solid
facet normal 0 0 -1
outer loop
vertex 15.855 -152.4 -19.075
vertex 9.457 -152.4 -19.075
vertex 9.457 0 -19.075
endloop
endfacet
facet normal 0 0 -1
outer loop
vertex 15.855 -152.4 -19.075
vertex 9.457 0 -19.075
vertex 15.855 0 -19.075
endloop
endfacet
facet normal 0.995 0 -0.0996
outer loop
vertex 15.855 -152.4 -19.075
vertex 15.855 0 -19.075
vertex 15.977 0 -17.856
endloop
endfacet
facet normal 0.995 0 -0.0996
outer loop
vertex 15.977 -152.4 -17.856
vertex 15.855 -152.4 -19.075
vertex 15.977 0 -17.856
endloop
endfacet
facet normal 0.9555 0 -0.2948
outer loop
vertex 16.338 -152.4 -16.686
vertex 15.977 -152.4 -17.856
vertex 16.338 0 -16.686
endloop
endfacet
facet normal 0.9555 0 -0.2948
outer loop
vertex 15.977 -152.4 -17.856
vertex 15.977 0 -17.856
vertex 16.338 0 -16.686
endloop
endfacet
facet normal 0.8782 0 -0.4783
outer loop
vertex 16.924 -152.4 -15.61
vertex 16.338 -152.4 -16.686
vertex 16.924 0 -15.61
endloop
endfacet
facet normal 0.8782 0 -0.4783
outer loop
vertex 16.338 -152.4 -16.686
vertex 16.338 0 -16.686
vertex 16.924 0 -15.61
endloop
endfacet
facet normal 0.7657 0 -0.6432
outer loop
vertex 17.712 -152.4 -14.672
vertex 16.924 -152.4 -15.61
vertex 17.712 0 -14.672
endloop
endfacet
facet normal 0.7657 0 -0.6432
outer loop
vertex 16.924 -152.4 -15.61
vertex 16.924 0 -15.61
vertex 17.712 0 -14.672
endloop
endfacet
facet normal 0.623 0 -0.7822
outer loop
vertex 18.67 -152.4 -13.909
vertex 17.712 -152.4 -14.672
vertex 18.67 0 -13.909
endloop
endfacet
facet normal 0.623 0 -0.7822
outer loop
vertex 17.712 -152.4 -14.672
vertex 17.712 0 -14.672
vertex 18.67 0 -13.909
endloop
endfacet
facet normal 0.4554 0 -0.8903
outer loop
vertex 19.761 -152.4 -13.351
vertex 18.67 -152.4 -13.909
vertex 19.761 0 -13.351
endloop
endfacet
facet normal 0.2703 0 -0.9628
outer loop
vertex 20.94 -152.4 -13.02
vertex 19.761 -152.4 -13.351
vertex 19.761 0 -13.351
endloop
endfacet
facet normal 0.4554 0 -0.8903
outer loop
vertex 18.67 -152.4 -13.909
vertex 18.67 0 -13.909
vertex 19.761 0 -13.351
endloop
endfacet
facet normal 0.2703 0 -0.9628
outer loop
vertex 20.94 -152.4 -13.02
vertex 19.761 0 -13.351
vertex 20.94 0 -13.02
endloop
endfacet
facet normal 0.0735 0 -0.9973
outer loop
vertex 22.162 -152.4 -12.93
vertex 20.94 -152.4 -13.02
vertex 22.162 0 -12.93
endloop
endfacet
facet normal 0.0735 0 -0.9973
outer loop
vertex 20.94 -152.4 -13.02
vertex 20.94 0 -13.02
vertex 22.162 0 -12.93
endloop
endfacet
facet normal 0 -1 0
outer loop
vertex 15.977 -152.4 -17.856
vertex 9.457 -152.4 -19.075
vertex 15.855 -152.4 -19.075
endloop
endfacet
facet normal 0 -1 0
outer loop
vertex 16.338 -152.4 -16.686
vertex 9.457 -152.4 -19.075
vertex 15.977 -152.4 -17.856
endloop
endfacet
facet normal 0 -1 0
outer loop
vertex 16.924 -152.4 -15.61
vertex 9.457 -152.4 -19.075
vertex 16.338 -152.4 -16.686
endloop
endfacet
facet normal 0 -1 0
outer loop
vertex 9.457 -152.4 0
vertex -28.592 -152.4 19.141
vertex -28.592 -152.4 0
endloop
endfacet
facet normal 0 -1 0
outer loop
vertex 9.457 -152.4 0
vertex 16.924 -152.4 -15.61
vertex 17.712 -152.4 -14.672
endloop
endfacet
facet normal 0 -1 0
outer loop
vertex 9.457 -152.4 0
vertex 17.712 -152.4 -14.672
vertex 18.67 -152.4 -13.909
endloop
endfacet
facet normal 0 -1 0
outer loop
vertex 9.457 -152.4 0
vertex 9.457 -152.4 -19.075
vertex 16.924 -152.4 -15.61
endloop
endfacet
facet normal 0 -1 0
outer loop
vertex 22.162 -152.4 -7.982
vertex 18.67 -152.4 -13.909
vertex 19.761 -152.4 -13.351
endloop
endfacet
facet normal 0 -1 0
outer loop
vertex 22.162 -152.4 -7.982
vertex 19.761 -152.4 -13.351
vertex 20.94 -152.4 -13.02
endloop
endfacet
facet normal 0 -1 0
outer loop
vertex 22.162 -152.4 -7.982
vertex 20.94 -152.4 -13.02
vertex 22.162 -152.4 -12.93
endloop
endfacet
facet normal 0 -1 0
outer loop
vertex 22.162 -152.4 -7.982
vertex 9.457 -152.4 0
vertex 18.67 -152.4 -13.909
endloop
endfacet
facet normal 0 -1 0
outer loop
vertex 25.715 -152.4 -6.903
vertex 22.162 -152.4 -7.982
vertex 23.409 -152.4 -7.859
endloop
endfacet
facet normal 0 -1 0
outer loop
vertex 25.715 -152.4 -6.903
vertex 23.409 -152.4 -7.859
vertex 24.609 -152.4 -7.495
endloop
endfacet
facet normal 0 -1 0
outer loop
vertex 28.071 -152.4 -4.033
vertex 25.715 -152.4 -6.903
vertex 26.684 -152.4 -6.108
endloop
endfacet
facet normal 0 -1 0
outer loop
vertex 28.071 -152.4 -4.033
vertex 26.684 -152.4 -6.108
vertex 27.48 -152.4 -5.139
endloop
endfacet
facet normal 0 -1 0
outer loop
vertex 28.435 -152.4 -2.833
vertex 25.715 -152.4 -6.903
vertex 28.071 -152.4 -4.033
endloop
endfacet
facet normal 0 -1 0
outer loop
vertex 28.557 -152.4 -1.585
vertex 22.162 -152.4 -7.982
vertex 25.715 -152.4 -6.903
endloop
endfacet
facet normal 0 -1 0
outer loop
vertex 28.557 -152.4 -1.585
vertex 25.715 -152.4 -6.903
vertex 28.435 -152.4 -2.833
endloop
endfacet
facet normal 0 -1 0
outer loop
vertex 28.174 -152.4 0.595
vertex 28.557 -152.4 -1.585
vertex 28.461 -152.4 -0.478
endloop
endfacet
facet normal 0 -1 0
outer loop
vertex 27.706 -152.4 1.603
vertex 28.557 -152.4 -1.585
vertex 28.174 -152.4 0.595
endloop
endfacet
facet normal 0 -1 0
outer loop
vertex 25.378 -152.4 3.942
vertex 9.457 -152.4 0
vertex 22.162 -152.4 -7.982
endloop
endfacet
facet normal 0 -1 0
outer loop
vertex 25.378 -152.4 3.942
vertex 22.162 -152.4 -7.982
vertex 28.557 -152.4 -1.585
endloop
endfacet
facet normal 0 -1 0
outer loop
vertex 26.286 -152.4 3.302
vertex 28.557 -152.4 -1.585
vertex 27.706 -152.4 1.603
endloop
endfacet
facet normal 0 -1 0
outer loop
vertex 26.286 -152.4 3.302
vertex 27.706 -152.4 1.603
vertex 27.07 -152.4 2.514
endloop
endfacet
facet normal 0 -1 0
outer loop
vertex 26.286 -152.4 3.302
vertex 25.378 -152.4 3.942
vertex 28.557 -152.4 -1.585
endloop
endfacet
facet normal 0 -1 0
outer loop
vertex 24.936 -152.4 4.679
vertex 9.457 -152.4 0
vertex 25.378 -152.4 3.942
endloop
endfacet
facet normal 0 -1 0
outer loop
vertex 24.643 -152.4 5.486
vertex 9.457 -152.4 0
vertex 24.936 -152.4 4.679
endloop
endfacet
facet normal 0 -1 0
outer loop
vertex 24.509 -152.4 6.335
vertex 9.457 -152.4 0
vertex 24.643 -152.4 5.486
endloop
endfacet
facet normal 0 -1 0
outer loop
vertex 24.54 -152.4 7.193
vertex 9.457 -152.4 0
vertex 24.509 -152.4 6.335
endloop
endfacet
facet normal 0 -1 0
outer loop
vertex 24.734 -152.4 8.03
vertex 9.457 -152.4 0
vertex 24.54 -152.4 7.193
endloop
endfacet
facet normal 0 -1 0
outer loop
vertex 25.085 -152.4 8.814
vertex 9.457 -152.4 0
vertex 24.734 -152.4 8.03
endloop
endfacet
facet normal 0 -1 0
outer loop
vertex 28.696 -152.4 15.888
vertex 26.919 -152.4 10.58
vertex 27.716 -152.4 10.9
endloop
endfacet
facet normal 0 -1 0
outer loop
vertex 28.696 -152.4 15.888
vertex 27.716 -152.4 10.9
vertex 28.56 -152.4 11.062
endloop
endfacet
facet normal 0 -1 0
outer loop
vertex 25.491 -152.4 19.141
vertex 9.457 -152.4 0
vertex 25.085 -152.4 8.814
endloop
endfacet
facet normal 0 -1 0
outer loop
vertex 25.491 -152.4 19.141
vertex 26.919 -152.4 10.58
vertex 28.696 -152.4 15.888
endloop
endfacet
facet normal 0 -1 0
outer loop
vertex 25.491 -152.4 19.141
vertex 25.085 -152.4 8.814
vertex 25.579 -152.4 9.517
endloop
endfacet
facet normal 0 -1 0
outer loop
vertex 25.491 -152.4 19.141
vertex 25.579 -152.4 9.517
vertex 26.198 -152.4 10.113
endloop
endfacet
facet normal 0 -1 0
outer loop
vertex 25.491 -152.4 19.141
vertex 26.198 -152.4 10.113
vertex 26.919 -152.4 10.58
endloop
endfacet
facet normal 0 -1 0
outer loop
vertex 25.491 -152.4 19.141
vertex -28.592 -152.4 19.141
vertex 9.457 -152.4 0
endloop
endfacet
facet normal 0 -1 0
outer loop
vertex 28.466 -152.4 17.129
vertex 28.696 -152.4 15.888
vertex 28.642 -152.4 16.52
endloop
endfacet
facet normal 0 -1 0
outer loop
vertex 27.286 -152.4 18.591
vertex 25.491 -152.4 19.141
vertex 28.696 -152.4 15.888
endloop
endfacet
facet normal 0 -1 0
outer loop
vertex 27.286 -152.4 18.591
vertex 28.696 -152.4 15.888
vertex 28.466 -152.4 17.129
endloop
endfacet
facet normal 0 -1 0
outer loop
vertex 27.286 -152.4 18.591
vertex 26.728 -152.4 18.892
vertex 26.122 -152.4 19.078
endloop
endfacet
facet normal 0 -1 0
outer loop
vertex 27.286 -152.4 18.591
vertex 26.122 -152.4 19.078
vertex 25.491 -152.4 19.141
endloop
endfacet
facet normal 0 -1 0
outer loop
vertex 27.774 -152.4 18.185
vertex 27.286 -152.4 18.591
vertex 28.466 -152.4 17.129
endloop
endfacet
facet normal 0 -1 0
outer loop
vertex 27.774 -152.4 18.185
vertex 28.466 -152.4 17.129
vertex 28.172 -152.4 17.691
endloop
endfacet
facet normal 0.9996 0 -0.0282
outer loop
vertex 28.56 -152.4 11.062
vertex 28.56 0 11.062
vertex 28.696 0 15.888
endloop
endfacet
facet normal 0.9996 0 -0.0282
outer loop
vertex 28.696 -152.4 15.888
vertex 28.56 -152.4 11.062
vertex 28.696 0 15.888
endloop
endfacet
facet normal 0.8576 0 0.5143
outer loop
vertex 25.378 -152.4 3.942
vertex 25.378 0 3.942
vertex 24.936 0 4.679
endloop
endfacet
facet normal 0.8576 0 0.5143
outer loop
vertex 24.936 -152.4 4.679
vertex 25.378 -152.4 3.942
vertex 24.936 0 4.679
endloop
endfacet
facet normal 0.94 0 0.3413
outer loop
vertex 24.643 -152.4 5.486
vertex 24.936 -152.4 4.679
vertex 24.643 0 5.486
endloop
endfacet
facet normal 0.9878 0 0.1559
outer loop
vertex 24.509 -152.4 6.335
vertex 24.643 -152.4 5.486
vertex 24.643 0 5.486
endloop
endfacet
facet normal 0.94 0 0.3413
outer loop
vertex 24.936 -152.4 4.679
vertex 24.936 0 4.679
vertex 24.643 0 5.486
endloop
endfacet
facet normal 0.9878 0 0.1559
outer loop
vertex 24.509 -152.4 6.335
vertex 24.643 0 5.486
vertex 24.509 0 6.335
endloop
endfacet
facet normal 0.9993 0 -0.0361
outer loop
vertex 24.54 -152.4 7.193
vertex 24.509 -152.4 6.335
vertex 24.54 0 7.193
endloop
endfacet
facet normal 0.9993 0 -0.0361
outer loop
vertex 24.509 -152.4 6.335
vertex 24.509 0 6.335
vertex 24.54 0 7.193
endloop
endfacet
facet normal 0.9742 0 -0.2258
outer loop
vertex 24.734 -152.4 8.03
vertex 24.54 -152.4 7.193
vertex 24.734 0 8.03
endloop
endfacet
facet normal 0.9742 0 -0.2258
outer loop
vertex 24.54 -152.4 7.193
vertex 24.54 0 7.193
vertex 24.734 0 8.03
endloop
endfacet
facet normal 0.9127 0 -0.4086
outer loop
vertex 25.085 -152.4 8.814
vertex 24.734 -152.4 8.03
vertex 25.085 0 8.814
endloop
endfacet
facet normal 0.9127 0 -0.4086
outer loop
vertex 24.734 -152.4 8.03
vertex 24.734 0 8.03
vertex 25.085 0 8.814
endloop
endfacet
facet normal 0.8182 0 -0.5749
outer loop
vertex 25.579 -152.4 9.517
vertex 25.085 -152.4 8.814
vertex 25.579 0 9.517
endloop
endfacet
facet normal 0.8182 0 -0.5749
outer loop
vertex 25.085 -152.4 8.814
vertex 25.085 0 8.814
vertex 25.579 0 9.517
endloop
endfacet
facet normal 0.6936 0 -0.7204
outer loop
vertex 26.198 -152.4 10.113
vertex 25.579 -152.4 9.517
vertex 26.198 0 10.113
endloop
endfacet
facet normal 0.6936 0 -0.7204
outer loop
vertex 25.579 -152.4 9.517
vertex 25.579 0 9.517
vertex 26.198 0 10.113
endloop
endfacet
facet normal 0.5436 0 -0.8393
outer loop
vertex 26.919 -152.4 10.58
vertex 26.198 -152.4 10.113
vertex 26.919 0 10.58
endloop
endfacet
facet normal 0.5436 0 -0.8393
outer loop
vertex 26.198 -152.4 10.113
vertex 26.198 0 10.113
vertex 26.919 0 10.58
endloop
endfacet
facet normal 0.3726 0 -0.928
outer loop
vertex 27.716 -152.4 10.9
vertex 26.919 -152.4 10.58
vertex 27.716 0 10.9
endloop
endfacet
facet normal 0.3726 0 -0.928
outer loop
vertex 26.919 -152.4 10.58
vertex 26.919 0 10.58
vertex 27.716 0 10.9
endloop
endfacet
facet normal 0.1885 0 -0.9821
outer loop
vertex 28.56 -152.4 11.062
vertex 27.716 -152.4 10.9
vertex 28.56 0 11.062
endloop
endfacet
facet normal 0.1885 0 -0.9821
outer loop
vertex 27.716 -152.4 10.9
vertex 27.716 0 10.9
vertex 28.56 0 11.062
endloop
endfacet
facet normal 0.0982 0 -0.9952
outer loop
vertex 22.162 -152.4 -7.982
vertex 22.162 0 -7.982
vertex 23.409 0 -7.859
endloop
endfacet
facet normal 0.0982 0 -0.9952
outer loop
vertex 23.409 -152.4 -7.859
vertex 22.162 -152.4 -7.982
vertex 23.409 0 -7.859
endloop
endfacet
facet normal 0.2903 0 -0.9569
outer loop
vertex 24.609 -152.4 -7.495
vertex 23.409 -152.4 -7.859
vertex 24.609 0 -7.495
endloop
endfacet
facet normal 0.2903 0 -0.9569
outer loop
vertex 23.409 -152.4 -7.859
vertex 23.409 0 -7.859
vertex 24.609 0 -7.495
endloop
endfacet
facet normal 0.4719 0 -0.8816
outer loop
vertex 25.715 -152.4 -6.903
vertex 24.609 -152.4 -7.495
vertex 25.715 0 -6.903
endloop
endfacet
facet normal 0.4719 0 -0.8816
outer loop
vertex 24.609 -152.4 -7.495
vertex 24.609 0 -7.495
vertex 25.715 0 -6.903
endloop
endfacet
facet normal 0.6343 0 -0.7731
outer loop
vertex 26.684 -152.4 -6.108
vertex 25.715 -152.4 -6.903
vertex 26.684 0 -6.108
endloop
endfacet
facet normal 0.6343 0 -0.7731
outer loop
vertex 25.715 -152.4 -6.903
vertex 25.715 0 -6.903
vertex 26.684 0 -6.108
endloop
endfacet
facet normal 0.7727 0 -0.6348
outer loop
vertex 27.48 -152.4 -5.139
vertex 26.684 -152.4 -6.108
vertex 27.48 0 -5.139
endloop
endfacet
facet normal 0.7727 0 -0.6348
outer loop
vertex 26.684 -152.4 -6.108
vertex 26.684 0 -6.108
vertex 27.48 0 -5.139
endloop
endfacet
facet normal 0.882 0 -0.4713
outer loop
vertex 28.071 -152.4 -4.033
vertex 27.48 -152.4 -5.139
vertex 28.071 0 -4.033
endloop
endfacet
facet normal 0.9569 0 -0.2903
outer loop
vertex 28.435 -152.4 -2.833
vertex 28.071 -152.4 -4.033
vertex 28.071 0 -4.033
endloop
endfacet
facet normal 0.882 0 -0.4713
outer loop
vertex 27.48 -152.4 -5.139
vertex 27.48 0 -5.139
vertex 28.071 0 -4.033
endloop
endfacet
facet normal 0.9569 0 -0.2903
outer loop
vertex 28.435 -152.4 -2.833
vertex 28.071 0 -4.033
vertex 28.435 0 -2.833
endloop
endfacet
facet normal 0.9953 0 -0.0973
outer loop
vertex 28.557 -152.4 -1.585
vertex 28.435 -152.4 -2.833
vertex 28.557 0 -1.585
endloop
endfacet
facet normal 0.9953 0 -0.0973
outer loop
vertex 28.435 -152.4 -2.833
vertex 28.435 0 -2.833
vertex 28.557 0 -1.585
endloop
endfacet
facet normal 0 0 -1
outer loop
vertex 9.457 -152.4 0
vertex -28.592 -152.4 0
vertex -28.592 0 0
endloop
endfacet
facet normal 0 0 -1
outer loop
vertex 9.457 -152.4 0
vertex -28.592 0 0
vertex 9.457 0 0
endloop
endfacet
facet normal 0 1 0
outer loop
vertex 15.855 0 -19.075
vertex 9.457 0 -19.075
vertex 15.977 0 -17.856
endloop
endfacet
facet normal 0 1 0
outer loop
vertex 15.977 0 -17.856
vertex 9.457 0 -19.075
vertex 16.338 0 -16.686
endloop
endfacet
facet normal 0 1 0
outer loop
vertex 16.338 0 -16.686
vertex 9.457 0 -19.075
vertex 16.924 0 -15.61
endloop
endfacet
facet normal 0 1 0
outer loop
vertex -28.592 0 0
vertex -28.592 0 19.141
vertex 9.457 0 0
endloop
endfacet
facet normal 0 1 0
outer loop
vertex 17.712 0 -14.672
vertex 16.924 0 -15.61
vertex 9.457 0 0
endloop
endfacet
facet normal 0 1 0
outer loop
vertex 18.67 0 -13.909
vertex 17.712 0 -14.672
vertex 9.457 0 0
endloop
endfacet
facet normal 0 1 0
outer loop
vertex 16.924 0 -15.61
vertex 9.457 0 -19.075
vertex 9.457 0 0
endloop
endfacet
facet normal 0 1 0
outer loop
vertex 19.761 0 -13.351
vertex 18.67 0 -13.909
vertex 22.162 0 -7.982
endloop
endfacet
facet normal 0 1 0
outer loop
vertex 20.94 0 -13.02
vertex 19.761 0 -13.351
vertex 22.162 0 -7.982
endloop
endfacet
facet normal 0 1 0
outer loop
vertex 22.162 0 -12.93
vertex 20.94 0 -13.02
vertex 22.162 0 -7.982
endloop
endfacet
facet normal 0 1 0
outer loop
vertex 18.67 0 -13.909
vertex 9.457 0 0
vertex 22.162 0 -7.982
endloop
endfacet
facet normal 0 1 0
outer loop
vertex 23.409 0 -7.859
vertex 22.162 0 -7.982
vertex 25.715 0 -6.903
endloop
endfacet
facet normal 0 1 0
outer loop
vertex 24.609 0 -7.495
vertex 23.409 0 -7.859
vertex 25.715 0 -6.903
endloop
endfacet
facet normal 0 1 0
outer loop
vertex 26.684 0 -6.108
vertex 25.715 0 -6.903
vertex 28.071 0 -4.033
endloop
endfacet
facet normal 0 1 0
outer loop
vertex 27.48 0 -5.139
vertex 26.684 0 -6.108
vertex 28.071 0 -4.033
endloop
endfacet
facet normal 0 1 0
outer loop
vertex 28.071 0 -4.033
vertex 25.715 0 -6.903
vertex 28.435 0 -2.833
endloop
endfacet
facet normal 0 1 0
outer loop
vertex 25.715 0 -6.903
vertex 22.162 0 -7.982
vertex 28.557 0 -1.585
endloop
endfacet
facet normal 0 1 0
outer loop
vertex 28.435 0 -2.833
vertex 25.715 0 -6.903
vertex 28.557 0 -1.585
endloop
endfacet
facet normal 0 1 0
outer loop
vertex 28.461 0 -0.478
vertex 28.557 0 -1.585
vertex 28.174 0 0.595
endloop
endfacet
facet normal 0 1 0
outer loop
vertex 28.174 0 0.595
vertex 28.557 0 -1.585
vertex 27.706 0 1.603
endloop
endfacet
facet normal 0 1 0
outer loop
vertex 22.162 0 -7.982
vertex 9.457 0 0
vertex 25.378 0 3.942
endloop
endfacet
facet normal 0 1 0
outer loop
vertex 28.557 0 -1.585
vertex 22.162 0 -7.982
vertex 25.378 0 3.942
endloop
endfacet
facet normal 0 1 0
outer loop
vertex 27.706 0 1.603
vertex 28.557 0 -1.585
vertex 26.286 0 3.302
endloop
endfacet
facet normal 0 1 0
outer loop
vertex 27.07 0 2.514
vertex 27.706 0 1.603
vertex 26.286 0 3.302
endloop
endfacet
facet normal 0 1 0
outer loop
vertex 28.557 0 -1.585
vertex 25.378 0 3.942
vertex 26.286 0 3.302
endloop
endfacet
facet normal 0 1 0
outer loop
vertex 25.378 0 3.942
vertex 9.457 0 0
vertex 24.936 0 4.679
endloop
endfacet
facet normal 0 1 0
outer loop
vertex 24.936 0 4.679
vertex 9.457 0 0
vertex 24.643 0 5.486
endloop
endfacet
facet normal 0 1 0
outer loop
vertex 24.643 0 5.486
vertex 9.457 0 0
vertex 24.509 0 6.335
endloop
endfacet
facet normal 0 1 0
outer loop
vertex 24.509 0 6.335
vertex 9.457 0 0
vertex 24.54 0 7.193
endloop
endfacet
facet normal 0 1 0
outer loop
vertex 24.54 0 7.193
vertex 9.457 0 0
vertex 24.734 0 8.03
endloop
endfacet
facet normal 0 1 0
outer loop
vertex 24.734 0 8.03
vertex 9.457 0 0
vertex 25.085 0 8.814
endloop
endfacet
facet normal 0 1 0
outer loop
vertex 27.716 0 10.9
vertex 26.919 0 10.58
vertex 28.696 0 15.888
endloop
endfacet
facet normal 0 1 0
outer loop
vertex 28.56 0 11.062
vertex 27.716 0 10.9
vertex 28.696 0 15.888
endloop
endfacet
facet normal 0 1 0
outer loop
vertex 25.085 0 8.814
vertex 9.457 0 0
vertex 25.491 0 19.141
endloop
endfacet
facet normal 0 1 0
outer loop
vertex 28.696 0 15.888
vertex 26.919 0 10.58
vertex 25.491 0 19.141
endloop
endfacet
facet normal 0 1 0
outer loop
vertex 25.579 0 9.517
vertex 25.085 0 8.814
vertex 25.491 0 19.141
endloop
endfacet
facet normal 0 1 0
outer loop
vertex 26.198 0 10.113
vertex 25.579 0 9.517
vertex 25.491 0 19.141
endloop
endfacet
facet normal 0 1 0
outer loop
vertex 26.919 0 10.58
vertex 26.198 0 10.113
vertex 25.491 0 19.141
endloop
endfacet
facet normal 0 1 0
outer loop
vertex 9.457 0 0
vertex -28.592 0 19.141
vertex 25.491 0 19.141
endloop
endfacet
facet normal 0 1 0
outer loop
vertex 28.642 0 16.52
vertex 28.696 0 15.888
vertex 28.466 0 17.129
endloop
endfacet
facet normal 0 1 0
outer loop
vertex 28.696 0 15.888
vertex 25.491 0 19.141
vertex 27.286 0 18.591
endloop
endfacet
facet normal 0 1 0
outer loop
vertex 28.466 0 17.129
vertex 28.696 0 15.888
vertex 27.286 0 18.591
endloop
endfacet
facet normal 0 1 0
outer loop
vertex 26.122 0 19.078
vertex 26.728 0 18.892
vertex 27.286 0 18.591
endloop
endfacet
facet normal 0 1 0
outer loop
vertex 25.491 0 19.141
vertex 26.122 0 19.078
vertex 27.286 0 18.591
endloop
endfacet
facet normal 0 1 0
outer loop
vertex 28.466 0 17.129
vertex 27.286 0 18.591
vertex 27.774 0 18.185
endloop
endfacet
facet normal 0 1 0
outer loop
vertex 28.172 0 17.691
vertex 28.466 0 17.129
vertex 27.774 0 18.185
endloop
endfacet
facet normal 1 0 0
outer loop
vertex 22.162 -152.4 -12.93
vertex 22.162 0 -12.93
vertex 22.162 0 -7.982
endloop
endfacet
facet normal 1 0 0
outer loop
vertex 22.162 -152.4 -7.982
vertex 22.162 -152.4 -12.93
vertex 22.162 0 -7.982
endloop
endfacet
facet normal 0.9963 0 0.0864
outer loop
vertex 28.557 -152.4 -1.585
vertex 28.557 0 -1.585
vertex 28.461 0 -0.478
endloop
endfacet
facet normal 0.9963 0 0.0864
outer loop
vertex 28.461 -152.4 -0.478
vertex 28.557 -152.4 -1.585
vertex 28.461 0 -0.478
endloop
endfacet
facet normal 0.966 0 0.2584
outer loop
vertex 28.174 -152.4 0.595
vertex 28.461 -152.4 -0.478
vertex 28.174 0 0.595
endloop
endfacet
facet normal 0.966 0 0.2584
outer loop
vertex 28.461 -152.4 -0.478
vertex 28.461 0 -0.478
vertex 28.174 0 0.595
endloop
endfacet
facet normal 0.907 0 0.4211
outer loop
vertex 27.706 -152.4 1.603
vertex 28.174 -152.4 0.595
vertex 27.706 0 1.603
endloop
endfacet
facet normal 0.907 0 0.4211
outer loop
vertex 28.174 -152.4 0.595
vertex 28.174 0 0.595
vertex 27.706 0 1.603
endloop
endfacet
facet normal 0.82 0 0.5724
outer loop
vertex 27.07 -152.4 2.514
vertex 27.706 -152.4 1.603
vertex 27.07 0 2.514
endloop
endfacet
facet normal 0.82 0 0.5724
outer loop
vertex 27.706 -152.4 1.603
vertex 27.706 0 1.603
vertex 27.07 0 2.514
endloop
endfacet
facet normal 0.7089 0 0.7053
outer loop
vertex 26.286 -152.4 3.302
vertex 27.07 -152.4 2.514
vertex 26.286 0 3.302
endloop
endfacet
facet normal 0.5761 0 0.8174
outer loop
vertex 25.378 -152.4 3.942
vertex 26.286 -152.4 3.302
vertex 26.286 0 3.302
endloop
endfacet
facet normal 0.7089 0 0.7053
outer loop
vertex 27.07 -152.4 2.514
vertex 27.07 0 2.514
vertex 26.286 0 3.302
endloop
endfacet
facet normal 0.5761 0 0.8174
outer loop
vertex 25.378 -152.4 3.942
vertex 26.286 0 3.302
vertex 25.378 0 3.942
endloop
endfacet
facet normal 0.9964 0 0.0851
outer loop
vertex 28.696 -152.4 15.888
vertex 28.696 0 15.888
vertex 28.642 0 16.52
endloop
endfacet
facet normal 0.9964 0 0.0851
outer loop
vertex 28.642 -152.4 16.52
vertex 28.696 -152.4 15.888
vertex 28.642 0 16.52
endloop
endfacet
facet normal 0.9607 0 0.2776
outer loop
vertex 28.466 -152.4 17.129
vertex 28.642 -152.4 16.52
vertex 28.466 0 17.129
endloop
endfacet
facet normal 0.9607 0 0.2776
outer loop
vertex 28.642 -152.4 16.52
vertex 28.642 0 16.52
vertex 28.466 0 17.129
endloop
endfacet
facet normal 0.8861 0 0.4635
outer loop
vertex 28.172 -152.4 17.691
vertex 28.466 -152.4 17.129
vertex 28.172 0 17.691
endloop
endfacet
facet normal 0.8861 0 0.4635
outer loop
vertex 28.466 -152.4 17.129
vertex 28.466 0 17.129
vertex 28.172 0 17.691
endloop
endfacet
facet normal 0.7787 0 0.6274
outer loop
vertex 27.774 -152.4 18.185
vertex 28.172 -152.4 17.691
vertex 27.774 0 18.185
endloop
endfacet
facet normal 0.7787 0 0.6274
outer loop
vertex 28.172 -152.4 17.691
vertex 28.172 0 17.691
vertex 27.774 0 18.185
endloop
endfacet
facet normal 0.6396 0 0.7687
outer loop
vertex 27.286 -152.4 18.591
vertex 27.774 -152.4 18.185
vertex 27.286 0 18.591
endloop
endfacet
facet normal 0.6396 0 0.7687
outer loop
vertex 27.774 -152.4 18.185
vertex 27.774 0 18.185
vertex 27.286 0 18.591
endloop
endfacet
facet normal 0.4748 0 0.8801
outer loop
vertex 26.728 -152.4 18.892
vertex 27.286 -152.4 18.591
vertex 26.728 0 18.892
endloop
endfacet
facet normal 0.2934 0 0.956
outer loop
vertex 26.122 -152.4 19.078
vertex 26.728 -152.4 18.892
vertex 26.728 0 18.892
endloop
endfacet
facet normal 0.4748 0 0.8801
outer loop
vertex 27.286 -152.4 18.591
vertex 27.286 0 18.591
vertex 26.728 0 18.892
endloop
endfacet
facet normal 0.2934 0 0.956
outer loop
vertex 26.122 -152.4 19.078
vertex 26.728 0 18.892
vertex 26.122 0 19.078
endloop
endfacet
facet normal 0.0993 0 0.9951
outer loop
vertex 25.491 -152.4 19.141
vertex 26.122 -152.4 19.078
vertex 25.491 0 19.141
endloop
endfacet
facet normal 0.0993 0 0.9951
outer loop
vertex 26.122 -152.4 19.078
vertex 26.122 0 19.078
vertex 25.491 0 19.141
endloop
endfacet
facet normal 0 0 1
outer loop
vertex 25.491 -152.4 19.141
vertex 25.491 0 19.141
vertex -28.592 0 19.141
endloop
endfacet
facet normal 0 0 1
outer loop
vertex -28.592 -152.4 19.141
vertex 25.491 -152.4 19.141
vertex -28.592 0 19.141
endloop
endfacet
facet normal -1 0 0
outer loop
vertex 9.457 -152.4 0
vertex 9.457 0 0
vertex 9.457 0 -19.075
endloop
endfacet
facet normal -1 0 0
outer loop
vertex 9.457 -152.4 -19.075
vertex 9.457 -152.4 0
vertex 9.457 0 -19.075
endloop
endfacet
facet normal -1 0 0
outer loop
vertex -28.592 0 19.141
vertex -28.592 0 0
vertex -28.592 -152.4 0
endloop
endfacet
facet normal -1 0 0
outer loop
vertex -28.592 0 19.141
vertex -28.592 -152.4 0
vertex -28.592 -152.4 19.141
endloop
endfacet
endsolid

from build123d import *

# Parameters (mm, degrees)
F0_W     = 38.0493849516
F0_H     = 19.1407520324
F1_DEPTH = 152.4


# Not quite as in the source:
# - ends of sketch curves that miss each other by under 0.0002 mm in the source are joined


with BuildPart() as f1:
    # F0 (on Front) → F1 (new body)
    with BuildSketch(Plane.XZ):
        with Locations((-9.5677897334, 9.5703760162)):
            Rectangle(F0_W, F0_H)
        with BuildLine():
            Line((9.4569027424, 19.1407520324), (9.4569027424, 0))
            Line((9.4569027424, 0), (9.4569027424, -19.074914977))
            Line((9.4569027424, -19.074914977), (15.8548746258, -19.074914977))
            ThreePointArc((15.8548746258, -19.074914977), (17.7121304526, -14.6721322023), (22.1616335674, -12.9297724811))
            Line((22.1616335674, -12.9297724811), (22.1616335674, -7.981513619))
            ThreePointArc((22.1616335674, -7.981513619), (26.6843883176, -6.1079115975), (28.5572540015, -1.5848518815))
            ThreePointArc((28.5572540015, -1.5848518815), (27.7056149725, 1.6028958779), (25.3783776729, 3.941914994))
            ThreePointArc((25.3783776729, 3.941914994), (24.8908493588, 8.4306069892), (28.559631396, 11.0623512867))
            Line((28.559631396, 11.0623512867), (28.695607532, 15.8877193117))
            ThreePointArc((28.695607532, 15.8877193117), (27.7740633897, 18.1849926711), (25.4908129573, 19.1407520324))
            Line((25.4908129573, 19.1407520324), (9.4569027424, 19.1407520324))
        make_face()
    extrude(amount=F1_DEPTH)


solid = f1.part
